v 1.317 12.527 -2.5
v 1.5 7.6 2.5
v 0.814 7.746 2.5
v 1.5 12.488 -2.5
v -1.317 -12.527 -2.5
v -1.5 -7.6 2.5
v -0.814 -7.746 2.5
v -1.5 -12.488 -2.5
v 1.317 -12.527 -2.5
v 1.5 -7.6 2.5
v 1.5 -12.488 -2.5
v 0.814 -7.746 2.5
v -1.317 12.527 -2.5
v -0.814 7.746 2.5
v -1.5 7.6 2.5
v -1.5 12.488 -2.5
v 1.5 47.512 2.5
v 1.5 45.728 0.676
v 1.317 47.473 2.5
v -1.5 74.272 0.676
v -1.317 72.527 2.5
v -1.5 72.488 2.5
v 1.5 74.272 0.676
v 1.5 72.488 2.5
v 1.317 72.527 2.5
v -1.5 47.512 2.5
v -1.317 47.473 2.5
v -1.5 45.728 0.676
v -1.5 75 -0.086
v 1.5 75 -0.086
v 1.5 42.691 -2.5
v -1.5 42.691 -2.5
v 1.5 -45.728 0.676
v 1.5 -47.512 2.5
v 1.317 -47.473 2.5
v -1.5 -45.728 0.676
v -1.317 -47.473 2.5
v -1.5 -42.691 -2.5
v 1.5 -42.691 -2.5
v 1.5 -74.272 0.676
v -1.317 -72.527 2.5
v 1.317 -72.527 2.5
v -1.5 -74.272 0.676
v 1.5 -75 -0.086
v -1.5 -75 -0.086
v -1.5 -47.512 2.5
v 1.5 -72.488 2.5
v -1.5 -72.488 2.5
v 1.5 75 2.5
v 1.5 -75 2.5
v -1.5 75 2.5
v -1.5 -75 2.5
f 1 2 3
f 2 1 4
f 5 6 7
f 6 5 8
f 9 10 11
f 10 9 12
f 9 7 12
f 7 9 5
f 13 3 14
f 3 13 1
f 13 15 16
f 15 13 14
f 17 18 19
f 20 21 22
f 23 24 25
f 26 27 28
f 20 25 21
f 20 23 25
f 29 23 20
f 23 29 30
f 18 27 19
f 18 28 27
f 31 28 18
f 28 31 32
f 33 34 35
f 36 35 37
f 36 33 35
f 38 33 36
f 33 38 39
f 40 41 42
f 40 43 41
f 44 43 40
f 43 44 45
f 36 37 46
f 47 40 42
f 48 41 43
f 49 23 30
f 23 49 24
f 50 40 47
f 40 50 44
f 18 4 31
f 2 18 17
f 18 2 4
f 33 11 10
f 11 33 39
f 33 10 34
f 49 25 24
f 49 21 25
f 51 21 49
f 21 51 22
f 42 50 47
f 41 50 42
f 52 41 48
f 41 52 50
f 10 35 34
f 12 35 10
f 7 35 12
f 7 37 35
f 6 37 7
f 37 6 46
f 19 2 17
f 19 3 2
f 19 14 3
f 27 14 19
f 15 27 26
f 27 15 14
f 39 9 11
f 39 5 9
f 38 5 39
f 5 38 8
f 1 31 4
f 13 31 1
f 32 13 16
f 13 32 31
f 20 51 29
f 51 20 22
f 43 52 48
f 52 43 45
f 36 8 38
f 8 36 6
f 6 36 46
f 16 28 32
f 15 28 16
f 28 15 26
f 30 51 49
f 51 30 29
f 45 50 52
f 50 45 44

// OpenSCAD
// file: plate_twin_lasers.scad
$fn=64;

plate_depth_new = 2.8;
plate_len = 120;
plate_width = 33;

// plate(plate_depth_new);

module plate(plate_depth) {
    difference() {
        base(plate_depth);
        holes();
    }
}

module holes() {
    // center
    cylinder(h=40, d=6.5, center=true);
    //left
    translate([0, -plate_len/2, 0])
    cylinder(h=40, d=6.5, center=true);
    // right
    translate([0, plate_len/2, 0])
    cylinder(h=40, d=6.5, center=true);
}

module base(plate_depth) {
    cube([plate_width, plate_len, plate_depth], center=true);
    // color("red")
    translate([0, -plate_len/2, 0])
    cylinder(h=plate_depth, d=plate_width, center=true);
    // color("green")
    translate([0, plate_len/2, 0])
    cylinder(h=plate_depth, d=plate_width, center=true);
}
// main file
use <plate_twin_lasers.scad>

plate_depth_new = 2.8;
plate_len = 120;
plate_width = 33;

//rib(rib_depth=3, rib_height=15.5);
rib_center_set(rib_depth=3, rib_height=5);

module rib_center_set(rib_depth, rib_height) {
    difference() {
        rib_center(rib_depth, rib_height);
        holes();
    }
}

module holes() {
    // center
    translate([0, 0, -5])
    cylinder(d1=55, d2=5, h=25+1, center=true);
    // right
    translate([0, plate_len/2])
    cylinder(d1=55, d2=5, h=25+1, center=true);
    // left
    translate([0, -plate_len/2])
    cylinder(d1=55, d2=5, h=25+1, center=true);
}

module rib_center(rib_depth, rib_height) {
    cube([rib_depth, 150, rib_height], center=true);
}

module rib(rib_depth, rib_height) {
    difference() {
        plate(plate_depth=rib_height);
        translate([0, 0, 0])
        cube([plate_width-rib_depth, plate_len, rib_height+1], center=true);
        color("red")
        translate([0, -plate_len/2, 0])
        cylinder(h=rib_height+1, d=plate_width-rib_depth, center=true);
        color("green")
        translate([0, plate_len/2, 0])
        cylinder(h=rib_height+1, d=plate_width-rib_depth, center=true);
    }
}
